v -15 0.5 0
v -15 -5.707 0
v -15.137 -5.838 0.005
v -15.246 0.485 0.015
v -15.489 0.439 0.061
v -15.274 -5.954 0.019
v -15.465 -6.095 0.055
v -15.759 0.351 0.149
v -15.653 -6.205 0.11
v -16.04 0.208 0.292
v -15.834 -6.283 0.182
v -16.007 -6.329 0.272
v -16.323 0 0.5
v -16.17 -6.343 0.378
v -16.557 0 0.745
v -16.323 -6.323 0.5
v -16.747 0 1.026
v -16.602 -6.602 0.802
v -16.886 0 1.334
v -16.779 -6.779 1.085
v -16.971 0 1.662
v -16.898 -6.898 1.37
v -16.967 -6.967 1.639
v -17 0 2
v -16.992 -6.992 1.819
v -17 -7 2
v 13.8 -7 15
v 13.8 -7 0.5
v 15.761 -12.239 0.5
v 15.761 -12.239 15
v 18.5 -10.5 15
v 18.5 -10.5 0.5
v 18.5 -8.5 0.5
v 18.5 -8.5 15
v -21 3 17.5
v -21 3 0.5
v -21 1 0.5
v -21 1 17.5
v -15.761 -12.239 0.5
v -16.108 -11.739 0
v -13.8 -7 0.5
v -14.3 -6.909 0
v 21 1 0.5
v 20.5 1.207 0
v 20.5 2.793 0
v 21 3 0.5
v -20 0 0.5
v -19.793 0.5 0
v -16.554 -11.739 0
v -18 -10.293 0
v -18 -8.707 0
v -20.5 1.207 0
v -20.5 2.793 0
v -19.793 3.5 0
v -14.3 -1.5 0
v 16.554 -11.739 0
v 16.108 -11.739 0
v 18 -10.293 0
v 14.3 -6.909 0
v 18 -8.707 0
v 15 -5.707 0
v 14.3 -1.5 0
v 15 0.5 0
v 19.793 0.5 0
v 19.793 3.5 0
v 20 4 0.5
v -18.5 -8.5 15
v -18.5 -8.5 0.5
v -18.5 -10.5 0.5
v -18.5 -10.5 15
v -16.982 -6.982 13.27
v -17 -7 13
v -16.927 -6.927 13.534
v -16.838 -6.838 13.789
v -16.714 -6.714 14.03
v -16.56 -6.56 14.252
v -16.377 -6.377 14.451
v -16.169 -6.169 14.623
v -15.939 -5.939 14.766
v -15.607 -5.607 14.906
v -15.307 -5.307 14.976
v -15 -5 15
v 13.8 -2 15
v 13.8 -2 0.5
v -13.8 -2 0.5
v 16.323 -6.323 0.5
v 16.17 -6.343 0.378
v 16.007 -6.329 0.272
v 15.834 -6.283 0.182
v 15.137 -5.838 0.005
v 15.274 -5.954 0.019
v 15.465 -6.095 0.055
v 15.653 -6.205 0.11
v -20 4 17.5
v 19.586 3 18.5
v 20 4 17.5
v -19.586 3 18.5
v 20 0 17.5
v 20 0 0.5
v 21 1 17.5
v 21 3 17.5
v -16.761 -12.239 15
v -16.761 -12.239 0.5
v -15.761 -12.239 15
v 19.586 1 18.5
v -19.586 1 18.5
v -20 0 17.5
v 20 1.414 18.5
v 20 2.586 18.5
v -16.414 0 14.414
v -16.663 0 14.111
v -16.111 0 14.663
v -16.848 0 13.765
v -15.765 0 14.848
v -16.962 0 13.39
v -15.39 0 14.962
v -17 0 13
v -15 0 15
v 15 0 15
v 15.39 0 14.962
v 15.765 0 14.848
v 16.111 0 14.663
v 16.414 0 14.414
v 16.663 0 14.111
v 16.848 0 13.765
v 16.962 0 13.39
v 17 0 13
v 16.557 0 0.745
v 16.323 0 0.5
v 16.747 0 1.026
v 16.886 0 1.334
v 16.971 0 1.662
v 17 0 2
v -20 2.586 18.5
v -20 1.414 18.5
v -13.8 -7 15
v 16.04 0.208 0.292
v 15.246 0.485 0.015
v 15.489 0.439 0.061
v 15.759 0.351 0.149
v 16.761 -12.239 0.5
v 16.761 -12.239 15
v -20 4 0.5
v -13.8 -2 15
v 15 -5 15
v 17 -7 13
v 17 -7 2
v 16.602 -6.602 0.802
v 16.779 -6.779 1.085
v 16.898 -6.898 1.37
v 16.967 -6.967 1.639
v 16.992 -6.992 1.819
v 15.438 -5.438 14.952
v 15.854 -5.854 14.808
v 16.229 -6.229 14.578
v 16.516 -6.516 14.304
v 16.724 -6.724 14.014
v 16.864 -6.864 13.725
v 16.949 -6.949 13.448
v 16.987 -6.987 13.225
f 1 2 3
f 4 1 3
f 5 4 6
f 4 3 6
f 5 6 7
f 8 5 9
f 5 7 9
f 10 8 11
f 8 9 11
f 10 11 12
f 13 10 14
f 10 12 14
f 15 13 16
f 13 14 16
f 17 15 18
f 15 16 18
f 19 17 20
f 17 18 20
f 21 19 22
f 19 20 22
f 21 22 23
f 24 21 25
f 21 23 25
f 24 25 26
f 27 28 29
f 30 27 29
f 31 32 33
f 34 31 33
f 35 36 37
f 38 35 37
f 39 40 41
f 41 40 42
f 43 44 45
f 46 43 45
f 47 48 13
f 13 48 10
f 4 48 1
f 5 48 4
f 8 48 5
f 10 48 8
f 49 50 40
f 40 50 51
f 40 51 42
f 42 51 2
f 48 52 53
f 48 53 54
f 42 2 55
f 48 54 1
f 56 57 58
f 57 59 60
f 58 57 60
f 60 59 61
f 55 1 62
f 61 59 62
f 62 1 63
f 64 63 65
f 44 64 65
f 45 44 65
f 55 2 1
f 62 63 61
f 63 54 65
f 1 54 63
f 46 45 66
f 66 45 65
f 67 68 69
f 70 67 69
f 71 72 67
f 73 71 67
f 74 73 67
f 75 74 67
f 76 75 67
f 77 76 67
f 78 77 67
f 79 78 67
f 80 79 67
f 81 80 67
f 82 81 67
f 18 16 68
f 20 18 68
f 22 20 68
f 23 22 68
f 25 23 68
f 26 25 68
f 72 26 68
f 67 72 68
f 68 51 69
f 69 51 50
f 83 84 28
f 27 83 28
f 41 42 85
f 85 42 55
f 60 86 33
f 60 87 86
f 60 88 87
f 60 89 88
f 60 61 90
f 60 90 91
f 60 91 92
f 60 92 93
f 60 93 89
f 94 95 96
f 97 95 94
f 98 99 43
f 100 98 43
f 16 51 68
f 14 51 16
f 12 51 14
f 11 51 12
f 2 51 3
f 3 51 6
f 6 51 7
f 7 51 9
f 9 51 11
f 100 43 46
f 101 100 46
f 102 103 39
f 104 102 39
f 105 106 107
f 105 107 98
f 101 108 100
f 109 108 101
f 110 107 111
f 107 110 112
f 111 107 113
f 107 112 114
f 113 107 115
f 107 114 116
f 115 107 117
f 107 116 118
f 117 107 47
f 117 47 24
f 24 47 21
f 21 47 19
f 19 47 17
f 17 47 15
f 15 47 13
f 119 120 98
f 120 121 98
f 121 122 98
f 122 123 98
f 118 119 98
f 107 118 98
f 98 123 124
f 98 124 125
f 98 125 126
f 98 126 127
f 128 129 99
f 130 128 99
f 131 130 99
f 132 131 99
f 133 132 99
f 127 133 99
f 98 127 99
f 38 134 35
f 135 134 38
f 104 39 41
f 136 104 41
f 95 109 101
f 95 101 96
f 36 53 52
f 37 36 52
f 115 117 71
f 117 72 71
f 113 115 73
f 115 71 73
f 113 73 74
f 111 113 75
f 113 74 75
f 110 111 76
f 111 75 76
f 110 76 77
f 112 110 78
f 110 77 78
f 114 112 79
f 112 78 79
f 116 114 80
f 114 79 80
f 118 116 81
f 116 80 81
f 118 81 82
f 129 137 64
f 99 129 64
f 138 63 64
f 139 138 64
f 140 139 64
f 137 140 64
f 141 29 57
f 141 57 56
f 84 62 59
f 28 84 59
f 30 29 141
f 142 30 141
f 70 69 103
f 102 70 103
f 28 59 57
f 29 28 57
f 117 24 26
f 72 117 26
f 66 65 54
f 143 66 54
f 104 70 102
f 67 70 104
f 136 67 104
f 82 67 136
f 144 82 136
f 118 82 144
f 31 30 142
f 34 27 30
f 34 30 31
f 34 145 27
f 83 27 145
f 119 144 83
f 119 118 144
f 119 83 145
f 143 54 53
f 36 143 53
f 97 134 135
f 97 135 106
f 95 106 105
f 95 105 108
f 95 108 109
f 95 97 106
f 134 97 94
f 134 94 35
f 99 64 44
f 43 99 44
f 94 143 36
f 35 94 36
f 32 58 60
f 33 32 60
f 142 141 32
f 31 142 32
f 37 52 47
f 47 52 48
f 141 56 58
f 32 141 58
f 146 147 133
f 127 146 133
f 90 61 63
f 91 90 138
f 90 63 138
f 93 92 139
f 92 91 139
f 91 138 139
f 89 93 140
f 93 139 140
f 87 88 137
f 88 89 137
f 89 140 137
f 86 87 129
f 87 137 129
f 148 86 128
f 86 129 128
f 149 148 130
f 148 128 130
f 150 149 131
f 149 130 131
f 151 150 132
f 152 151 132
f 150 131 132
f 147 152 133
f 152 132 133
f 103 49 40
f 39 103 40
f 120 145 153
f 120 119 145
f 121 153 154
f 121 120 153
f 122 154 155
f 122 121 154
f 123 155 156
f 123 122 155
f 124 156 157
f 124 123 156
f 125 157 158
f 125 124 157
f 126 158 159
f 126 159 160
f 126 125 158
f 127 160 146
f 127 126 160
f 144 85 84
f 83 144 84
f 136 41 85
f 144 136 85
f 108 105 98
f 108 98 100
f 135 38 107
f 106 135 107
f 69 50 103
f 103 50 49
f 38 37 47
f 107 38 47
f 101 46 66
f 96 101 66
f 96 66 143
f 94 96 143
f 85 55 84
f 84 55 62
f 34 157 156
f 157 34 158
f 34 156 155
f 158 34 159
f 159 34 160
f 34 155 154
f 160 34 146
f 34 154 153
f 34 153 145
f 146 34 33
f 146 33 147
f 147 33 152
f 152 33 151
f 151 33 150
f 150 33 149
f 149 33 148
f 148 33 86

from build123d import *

# Parameters (mm, degrees)
F1_DEPTH = 15
F3_DEPTH = 3.5
F4_SIZE  = 1
F5_R     = 2
F6_SIZE  = 0.5


with BuildPart() as f1:
    # F0 (on Top) → F1 (new body)
    with BuildSketch(Plane.XY):
        Polygon((-21, 1), (-20, 0), (-17.5, 0), (-17, 0), (-17, -7), (-17.5, -7.5), (-17.5, -10), (-18.5, -10), (-18.5, -10.5), (-16.761138632, -12.238861368), (-15.761138632, -12.238861368), (-13.8, -7), (-13.8, -2), (0, -2), (13.8, -2), (13.8, -7), (15.761138632, -12.238861368), (16.761138632, -12.238861368), (18.5, -10.5), (18.5, -10), (17.5, -10), (17.5, -7.5), (17, -7), (17, 0), (17.5, 0), (20, 0), (21, 1), (21, 3), (20, 4), (0, 4), (-20, 4), (-21, 3), align=None)
        Polygon((-17.5, -10), (-17.5, -7.5), (-18.5, -8.5), (-18.5, -10), align=None)
        Polygon((18.5, -8.5), (17.5, -7.5), (17.5, -10), (18.5, -10), align=None)
    extrude(amount=F1_DEPTH)

    # F2 (on face) → F3 (join)
    with BuildSketch(Plane.XY.offset(15)):
        Polygon((-20, 0), (-17, 0), (17, 0), (20, 0), (21, 1), (21, 3), (20, 4), (-20, 4), (-21, 3), (-21, 1), align=None)
    extrude(amount=F3_DEPTH)

    # F4
    f4_edges = [f1.edges().sort_by_distance(p)[0] for p in [
        (0, 0, 18.5),
        (20.5, 0.5, 18.5),
        (21, 2, 18.5),
        (20.5, 3.5, 18.5),
        (0, 4, 18.5),
        (-20.5, 3.5, 18.5),
        (-21, 2, 18.5),
        (-20.5, 0.5, 18.5),
    ]]
    chamfer(f4_edges, length=F4_SIZE)

    # F5
    f5_edges = [f1.edges().sort_by_distance(p)[0] for p in [
        (-17, -3.5, 0),
        (-17, -3.5, 15),
        (17, -3.5, 0),
        (17, -3.5, 15),
    ]]
    fillet(f5_edges, radius=F5_R)

    # F6
    f6_edges = [f1.edges().sort_by_distance(p)[0] for p in [
        (-16, 0, 0),
        (-18.5, 0, 0),
        (-15, -2.5, 0),
        (-20.5, 0.5, 0),
        (-16, -6, 0),
        (-21, 2, 0),
        (-17.75, -7.75, 0),
        (-20.5, 3.5, 0),
        (-18.5, -9.5, 0),
        (0, 4, 0),
        (-17.630569, -11.369431, 0),
        (20.5, 3.5, 0),
        (-16.261139, -12.238861, 0),
        (21, 2, 0),
        (-14.780569, -9.619431, 0),
        (20.5, 0.5, 0),
        (-13.8, -4.5, 0),
        (18.5, 0, 0),
        (0, -2, 0),
        (16, 0, 0),
        (13.8, -4.5, 0),
        (15, -2.5, 0),
        (14.780569, -9.619431, 0),
        (16, -6, 0),
        (16.261139, -12.238861, 0),
        (17.75, -7.75, 0),
        (17.630569, -11.369431, 0),
        (18.5, -9.5, 0),
    ]]
    chamfer(f6_edges, length=F6_SIZE)


solid = f1.part
